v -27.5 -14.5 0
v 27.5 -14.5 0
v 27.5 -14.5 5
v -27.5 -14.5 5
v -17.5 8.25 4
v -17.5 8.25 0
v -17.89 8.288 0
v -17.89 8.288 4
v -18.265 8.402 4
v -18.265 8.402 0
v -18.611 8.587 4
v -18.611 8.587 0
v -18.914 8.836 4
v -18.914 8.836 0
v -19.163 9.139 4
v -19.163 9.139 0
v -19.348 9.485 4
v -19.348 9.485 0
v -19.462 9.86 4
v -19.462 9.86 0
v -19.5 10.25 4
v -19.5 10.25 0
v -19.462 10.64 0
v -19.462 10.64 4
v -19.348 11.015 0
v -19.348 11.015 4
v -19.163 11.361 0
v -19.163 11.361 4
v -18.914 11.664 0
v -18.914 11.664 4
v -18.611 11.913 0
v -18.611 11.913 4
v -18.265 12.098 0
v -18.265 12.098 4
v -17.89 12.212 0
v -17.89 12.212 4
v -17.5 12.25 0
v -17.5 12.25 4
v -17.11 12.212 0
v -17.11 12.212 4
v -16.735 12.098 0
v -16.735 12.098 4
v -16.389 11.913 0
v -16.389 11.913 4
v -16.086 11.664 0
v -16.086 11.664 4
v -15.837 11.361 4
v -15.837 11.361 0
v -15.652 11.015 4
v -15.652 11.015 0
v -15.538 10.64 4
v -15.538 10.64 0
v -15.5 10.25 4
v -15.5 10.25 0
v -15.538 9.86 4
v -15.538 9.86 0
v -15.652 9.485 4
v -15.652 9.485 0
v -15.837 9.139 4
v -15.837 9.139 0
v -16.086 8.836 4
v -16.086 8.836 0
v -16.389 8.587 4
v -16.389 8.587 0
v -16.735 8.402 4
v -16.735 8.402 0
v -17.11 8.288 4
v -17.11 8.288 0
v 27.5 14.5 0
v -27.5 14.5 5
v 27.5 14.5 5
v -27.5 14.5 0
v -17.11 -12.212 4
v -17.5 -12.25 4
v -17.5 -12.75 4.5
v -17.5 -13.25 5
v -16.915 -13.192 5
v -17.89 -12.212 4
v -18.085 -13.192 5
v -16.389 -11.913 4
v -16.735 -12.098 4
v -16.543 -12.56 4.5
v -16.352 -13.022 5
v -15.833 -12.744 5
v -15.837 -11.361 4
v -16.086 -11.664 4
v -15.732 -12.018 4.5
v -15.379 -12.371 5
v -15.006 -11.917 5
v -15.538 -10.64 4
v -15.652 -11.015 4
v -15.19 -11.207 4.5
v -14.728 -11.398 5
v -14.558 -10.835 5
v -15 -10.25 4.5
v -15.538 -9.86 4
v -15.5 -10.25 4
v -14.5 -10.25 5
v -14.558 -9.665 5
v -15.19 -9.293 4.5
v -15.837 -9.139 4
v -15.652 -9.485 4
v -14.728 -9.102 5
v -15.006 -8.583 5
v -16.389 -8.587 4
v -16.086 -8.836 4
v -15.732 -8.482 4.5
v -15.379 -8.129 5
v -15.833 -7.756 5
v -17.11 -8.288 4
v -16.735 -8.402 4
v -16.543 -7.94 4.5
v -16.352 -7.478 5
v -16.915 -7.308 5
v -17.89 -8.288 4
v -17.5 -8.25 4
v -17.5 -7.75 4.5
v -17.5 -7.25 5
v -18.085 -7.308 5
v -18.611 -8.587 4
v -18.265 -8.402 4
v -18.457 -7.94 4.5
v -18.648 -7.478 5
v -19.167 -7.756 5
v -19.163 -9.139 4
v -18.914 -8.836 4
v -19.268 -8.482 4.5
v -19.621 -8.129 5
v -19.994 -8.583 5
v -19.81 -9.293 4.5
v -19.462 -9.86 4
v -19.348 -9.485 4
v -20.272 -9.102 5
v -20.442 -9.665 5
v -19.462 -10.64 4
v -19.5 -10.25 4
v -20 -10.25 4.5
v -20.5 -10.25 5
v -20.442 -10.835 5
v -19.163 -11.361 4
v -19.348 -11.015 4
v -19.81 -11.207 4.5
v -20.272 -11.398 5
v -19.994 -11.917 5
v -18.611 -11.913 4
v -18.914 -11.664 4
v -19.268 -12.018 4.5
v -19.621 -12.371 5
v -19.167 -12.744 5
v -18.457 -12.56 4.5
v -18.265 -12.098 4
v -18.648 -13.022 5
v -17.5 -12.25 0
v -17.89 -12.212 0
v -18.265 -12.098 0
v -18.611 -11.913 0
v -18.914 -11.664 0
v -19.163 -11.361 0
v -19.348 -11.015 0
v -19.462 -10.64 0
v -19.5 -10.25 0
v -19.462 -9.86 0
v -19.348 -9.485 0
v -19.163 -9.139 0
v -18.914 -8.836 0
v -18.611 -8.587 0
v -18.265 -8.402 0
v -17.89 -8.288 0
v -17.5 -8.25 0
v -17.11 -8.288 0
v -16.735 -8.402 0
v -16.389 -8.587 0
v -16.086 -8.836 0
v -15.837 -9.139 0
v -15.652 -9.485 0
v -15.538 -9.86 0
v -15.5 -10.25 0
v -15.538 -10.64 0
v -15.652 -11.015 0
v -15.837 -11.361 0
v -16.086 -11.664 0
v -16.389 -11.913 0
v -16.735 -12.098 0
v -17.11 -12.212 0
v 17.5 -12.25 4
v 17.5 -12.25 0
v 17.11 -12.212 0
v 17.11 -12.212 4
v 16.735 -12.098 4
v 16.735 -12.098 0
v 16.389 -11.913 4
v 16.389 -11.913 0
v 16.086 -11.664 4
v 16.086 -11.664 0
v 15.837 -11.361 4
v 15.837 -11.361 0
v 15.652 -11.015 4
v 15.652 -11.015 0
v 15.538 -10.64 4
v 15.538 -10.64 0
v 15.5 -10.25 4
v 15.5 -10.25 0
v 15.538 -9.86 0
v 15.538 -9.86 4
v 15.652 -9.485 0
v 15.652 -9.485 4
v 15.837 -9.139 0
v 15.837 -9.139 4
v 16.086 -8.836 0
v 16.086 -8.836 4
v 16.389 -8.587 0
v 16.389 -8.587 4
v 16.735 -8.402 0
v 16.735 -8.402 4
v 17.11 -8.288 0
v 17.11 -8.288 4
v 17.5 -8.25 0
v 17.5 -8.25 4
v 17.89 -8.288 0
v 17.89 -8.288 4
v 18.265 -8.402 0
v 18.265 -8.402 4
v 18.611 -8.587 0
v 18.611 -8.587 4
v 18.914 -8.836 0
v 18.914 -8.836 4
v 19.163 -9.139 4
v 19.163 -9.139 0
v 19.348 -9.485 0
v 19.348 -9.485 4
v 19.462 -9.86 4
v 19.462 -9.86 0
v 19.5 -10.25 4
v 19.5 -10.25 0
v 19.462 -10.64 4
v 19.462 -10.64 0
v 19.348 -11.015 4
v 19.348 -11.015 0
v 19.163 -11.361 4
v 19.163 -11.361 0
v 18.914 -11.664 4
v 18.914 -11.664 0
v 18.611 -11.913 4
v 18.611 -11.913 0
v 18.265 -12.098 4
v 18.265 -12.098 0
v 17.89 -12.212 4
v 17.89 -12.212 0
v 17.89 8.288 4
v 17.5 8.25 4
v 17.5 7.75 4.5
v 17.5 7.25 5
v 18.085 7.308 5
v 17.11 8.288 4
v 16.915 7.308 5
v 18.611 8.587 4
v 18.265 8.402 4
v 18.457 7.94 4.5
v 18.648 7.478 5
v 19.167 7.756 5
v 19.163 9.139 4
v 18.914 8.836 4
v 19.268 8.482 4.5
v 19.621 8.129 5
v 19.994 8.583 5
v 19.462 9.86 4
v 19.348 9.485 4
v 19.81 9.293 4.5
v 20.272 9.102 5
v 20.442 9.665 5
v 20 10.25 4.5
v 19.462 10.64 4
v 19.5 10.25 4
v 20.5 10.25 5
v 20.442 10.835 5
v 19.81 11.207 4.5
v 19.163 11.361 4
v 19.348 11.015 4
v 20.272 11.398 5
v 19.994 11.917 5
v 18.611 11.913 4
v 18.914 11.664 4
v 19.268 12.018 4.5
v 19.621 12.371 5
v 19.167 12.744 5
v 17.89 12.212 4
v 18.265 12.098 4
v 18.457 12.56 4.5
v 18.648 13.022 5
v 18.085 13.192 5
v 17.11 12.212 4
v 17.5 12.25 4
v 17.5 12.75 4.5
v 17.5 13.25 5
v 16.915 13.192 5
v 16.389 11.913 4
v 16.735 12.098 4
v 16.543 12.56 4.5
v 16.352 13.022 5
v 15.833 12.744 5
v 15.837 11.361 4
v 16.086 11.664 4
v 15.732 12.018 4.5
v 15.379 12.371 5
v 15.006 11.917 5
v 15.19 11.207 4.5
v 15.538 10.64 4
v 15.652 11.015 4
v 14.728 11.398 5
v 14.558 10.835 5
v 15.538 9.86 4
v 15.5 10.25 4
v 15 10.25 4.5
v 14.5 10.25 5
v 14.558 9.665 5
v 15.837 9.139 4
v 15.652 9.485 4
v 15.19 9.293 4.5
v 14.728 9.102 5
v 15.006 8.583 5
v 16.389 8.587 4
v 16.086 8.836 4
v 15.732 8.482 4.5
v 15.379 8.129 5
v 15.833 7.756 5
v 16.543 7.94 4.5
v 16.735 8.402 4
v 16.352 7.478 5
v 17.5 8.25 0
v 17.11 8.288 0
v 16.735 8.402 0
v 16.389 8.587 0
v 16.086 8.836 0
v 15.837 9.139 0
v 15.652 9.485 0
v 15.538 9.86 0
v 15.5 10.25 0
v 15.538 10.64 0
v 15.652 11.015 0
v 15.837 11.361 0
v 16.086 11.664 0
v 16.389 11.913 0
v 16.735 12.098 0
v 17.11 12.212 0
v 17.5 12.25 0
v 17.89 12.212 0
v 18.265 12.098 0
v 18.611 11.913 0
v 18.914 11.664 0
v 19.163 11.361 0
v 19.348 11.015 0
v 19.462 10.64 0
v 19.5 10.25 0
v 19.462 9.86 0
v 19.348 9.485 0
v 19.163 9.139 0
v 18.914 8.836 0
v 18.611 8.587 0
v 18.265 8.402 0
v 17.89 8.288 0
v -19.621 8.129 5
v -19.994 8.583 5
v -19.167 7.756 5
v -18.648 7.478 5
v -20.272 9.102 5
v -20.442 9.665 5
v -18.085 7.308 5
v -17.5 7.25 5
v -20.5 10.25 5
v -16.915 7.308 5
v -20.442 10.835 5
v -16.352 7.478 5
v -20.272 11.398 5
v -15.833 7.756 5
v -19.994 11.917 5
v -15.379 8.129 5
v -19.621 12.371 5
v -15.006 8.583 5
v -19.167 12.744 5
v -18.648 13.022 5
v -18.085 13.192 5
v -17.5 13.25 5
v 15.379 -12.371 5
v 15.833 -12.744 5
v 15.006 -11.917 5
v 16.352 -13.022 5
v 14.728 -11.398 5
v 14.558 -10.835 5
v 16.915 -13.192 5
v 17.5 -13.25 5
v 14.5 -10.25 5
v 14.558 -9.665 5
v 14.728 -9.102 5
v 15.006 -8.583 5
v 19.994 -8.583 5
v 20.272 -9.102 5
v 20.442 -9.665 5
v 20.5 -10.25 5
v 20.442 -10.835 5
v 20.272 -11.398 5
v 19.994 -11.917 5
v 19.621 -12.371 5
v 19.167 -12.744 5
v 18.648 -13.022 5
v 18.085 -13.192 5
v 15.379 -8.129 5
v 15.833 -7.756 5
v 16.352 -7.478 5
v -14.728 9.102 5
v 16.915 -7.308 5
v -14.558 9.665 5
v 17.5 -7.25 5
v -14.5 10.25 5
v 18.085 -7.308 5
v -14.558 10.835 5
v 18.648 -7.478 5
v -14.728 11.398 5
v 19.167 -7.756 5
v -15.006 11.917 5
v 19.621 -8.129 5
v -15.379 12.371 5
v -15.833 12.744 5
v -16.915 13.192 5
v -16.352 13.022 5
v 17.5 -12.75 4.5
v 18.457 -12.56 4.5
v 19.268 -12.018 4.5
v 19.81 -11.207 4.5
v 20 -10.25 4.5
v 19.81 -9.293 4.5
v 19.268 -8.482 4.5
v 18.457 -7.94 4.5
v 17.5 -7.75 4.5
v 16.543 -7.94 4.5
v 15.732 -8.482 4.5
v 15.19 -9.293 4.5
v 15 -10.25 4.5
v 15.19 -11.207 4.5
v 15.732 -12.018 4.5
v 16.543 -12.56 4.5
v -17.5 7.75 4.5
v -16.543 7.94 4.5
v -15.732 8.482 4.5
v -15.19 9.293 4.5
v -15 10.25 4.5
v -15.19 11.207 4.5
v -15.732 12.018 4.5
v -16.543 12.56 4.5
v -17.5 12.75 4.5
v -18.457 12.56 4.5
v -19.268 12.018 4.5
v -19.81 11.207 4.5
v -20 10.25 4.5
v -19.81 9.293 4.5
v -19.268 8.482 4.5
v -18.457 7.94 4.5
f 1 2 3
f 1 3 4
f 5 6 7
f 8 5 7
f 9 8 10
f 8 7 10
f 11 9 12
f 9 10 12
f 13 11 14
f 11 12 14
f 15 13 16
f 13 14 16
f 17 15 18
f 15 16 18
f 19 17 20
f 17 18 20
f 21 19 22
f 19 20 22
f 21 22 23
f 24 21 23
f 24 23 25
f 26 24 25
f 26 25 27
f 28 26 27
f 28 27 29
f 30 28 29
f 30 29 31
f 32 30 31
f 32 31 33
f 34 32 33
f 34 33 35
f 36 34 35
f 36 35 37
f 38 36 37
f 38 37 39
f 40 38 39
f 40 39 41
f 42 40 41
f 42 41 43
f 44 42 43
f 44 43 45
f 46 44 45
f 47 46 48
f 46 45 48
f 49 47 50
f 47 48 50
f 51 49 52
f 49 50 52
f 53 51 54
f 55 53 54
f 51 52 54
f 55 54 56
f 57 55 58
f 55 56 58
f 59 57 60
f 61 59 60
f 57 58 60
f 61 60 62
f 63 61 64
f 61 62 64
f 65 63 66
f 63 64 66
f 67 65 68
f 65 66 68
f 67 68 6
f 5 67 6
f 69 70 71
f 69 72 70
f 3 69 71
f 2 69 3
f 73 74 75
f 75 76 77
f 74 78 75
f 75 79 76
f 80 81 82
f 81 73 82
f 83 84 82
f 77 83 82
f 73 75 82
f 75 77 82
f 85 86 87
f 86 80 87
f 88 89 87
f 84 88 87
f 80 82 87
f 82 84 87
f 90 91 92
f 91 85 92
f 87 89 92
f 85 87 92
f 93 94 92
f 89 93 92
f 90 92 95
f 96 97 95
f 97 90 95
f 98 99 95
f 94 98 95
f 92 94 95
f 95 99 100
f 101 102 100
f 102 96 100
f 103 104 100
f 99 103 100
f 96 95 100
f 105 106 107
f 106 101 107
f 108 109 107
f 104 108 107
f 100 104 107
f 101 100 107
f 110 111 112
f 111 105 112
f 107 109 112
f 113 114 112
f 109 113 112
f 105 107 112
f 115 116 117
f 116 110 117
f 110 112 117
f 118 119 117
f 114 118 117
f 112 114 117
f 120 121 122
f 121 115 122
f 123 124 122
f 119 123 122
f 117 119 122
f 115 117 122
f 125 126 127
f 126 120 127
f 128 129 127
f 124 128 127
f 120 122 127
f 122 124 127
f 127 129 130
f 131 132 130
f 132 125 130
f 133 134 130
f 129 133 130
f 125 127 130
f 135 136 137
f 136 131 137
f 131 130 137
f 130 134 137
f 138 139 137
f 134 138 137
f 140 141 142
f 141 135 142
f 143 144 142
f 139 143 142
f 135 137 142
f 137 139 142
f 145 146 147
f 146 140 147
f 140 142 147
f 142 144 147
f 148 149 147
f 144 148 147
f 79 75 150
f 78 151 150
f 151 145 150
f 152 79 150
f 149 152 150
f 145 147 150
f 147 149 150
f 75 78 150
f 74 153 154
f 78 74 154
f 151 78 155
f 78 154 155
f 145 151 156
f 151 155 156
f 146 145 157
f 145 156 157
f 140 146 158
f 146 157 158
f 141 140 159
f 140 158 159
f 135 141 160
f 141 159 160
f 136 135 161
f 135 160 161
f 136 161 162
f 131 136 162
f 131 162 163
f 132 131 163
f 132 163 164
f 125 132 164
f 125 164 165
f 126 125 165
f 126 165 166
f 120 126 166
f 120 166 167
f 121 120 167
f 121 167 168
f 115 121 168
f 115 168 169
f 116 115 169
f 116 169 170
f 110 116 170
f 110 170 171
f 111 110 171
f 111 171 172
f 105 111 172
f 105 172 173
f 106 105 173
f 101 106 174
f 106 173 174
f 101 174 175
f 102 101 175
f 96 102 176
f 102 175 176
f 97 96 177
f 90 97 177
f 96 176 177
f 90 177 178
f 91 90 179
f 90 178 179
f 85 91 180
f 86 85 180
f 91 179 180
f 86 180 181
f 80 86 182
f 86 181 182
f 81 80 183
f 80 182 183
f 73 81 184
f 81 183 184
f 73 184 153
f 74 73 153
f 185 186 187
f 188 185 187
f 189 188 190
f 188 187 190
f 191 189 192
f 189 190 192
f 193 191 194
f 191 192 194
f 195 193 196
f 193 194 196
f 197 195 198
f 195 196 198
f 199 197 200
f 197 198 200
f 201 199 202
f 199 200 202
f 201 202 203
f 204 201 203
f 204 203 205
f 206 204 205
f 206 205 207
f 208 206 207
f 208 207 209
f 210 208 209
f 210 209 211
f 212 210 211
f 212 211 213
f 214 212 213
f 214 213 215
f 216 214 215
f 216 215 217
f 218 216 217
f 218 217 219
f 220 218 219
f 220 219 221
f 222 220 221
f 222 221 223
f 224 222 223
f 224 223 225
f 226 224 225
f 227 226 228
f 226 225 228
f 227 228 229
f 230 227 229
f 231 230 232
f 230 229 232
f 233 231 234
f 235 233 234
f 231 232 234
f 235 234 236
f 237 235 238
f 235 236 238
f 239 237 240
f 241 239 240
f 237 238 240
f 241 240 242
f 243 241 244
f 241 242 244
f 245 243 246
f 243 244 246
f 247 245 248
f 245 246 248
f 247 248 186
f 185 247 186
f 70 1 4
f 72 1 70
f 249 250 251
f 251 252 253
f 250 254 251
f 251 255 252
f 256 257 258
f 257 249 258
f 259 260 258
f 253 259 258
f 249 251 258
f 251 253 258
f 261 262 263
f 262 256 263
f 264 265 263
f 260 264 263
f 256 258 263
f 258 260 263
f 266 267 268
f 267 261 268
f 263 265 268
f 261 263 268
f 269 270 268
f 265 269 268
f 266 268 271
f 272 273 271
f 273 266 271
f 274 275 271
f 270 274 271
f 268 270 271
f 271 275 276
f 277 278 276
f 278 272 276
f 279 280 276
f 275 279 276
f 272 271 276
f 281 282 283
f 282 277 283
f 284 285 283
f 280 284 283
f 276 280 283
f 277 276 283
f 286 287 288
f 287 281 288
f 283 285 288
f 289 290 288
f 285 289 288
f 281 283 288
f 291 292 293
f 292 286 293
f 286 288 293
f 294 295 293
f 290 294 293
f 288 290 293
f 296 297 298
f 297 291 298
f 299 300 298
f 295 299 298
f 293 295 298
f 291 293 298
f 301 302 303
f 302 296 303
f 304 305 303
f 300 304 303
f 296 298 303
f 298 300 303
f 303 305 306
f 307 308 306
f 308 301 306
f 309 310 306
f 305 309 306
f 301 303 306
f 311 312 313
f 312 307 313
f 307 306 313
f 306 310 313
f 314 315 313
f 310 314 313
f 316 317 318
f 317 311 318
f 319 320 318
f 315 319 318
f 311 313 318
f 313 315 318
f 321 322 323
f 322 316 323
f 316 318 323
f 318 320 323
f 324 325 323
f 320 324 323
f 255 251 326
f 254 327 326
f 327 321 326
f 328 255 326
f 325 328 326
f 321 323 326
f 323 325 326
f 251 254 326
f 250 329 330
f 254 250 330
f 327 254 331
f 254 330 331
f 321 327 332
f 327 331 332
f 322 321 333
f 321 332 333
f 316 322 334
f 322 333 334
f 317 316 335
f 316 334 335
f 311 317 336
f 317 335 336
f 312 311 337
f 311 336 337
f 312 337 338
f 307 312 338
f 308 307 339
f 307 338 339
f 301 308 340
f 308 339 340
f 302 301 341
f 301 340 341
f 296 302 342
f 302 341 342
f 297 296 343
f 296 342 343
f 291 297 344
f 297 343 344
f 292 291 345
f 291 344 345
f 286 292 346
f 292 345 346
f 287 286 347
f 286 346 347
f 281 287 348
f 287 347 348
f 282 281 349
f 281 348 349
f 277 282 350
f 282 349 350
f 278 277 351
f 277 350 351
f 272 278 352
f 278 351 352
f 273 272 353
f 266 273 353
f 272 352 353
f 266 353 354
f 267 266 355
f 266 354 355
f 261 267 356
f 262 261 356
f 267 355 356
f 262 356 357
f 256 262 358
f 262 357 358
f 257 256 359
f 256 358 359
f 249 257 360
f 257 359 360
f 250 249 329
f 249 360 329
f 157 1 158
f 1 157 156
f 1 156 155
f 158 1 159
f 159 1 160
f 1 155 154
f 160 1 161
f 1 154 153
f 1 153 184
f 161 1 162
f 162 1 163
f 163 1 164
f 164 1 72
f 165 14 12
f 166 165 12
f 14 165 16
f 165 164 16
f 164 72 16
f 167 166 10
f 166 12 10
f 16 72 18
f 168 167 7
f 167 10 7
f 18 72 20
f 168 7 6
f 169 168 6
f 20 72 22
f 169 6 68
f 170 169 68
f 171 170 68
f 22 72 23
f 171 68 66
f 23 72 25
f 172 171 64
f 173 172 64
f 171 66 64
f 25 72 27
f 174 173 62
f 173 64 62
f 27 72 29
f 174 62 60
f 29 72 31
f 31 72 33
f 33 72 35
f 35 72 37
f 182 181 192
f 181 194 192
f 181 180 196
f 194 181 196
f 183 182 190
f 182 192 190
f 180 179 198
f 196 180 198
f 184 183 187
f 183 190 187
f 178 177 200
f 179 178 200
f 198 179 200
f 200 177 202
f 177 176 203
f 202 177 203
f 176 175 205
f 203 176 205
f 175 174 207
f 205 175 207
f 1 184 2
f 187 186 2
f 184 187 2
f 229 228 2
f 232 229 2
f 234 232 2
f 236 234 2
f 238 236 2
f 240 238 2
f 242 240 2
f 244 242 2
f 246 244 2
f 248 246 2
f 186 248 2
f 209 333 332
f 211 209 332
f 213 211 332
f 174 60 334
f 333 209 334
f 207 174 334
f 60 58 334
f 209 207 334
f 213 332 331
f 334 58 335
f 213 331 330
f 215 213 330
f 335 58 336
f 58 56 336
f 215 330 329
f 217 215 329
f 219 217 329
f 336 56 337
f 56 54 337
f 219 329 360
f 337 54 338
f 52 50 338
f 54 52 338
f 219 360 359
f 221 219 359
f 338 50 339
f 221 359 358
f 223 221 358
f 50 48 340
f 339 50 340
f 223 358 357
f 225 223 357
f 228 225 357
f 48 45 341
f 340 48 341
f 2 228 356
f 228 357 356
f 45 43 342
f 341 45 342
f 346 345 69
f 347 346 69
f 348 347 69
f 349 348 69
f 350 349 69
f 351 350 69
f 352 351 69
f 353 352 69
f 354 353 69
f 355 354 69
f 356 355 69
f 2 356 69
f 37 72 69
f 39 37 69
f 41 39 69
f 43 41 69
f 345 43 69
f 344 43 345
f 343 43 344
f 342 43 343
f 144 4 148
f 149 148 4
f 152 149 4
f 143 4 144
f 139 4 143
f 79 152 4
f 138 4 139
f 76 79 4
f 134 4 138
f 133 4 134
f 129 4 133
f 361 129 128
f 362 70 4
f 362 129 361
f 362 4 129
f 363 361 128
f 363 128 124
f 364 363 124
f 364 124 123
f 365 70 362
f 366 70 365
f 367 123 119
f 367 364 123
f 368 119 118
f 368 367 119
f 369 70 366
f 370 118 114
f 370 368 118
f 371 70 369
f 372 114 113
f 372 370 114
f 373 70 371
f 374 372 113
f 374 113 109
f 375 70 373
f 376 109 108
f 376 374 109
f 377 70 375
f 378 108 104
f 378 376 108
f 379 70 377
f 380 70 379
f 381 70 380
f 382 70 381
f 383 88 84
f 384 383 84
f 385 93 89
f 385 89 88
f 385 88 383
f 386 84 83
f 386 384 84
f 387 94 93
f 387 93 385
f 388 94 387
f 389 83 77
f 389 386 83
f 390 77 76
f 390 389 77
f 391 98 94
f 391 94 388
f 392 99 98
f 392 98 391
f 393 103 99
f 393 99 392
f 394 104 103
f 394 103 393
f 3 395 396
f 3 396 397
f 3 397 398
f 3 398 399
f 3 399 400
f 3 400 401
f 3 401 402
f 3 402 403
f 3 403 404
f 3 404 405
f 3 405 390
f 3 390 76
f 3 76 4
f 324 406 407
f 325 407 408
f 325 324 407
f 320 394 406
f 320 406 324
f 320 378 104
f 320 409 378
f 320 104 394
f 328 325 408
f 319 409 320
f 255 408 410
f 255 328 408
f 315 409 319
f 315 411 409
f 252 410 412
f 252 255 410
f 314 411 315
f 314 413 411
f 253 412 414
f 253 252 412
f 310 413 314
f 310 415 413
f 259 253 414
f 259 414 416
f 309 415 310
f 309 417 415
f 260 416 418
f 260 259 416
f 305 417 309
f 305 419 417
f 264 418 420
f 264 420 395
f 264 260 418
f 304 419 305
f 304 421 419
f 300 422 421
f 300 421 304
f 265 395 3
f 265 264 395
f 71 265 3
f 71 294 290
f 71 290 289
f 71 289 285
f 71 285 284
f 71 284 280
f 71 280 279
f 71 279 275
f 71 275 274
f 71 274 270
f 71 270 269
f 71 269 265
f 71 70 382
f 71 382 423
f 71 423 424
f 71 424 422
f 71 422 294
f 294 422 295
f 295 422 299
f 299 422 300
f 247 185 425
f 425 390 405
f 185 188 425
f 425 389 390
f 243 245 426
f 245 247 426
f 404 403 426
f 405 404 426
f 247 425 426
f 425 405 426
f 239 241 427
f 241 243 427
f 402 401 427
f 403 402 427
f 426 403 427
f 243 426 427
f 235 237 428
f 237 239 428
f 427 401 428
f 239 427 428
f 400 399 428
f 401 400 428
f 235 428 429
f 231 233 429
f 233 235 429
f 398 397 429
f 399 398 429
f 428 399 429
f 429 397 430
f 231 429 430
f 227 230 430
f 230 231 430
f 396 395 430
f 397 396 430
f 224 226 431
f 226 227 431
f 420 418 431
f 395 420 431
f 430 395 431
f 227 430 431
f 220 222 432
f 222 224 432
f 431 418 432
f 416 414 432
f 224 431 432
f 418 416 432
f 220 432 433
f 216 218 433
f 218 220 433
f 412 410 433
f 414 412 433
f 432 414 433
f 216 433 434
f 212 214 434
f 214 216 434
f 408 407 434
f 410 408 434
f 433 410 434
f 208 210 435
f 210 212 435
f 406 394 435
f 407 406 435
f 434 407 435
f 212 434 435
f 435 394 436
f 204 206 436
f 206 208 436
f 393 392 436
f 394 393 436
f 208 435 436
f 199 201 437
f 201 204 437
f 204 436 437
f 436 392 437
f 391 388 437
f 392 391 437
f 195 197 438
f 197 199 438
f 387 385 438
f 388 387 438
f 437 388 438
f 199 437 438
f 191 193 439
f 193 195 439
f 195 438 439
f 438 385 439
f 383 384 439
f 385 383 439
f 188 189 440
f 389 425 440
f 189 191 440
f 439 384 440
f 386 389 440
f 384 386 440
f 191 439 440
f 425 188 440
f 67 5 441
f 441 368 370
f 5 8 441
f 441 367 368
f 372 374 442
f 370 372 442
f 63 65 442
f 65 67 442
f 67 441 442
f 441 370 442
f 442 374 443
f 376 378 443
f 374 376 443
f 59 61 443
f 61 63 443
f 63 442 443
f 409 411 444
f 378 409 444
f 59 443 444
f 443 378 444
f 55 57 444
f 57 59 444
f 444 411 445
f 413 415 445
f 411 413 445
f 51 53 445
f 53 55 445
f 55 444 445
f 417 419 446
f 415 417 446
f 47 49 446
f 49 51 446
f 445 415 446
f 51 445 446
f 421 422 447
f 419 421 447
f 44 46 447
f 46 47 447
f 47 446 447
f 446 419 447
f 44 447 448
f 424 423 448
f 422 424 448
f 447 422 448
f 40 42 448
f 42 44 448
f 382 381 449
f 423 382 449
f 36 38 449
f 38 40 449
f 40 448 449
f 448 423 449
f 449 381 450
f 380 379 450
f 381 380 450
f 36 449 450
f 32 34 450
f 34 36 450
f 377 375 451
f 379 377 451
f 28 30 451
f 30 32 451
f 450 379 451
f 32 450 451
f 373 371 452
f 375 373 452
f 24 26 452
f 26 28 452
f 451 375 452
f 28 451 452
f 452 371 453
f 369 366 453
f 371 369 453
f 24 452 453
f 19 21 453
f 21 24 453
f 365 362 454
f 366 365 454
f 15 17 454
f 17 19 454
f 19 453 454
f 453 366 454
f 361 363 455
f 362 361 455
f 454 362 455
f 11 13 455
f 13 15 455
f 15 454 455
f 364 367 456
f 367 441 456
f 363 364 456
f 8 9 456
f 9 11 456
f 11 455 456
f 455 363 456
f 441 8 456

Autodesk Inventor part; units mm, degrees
ref_plane "YZ Plane" through (0, 0, 0) normal (1, 0, 0) x (0, 1, 0)
ref_plane "XZ Plane" through (0, 0, 0) normal (0, 1, 0) x (-1, 0, 0)
ref_plane "XY Plane" through (0, 0, 0) normal (0, 0, 1) x (1, 0, 0)
sketch "Esboço1" plane through (0, 0, 0) normal (0, 0, 1) x (1, 0, 0)
  line L0 (27.5, -14.5) -> (-27.5, -14.5)
  line L1 (-27.5, -14.5) -> (-27.5, 14.5)
  line L2 (-27.5, 14.5) -> (27.5, 14.5)
  line L3 (27.5, 14.5) -> (27.5, -14.5)
  line L4 (27.5, -14.5) -> (-27.5, 14.5) construction
  line L5 (-27.5, -14.5) -> (27.5, 14.5) construction
  point P0 (0, 0)
  dimension "d0" = 55
  dimension "d1" = 29
extrude "Extrusão1" add sketch "Esboço1" along normal blind 5
sketch "Esboço2" plane through (0, 0, 5) normal (0, 0, 1) x (1, 0, 0)
  line L0 (-27.5, 14.5) -> (-27.5, -14.5) projected
  line L1 (27.5, 14.5) -> (-27.5, 14.5) projected
  line L2 (0, 0) -> (-7.3879, 0)
  line L3 (0, 0) -> (0, 5.1516)
  point P0 (-17.5, 10.25)
  point P1 (17.5, 10.25)
  point P2 (-17.5, -10.25)
  point P3 (17.5, -10.25)
  dimension "d4" = 10
  dimension "d5" = 4.25
hole "Furo1" at (-17.5, 10.25, 5) at (17.5, 10.25, 5) at (-17.5, -10.25, 5) at (17.5, -10.25, 5) direction (0, 0, -1) diameter 4 end through all countersink diameter 6 countersink angle 90
properties part number "Tampa Apoio Motor" material "Plástico PC/ABS"
